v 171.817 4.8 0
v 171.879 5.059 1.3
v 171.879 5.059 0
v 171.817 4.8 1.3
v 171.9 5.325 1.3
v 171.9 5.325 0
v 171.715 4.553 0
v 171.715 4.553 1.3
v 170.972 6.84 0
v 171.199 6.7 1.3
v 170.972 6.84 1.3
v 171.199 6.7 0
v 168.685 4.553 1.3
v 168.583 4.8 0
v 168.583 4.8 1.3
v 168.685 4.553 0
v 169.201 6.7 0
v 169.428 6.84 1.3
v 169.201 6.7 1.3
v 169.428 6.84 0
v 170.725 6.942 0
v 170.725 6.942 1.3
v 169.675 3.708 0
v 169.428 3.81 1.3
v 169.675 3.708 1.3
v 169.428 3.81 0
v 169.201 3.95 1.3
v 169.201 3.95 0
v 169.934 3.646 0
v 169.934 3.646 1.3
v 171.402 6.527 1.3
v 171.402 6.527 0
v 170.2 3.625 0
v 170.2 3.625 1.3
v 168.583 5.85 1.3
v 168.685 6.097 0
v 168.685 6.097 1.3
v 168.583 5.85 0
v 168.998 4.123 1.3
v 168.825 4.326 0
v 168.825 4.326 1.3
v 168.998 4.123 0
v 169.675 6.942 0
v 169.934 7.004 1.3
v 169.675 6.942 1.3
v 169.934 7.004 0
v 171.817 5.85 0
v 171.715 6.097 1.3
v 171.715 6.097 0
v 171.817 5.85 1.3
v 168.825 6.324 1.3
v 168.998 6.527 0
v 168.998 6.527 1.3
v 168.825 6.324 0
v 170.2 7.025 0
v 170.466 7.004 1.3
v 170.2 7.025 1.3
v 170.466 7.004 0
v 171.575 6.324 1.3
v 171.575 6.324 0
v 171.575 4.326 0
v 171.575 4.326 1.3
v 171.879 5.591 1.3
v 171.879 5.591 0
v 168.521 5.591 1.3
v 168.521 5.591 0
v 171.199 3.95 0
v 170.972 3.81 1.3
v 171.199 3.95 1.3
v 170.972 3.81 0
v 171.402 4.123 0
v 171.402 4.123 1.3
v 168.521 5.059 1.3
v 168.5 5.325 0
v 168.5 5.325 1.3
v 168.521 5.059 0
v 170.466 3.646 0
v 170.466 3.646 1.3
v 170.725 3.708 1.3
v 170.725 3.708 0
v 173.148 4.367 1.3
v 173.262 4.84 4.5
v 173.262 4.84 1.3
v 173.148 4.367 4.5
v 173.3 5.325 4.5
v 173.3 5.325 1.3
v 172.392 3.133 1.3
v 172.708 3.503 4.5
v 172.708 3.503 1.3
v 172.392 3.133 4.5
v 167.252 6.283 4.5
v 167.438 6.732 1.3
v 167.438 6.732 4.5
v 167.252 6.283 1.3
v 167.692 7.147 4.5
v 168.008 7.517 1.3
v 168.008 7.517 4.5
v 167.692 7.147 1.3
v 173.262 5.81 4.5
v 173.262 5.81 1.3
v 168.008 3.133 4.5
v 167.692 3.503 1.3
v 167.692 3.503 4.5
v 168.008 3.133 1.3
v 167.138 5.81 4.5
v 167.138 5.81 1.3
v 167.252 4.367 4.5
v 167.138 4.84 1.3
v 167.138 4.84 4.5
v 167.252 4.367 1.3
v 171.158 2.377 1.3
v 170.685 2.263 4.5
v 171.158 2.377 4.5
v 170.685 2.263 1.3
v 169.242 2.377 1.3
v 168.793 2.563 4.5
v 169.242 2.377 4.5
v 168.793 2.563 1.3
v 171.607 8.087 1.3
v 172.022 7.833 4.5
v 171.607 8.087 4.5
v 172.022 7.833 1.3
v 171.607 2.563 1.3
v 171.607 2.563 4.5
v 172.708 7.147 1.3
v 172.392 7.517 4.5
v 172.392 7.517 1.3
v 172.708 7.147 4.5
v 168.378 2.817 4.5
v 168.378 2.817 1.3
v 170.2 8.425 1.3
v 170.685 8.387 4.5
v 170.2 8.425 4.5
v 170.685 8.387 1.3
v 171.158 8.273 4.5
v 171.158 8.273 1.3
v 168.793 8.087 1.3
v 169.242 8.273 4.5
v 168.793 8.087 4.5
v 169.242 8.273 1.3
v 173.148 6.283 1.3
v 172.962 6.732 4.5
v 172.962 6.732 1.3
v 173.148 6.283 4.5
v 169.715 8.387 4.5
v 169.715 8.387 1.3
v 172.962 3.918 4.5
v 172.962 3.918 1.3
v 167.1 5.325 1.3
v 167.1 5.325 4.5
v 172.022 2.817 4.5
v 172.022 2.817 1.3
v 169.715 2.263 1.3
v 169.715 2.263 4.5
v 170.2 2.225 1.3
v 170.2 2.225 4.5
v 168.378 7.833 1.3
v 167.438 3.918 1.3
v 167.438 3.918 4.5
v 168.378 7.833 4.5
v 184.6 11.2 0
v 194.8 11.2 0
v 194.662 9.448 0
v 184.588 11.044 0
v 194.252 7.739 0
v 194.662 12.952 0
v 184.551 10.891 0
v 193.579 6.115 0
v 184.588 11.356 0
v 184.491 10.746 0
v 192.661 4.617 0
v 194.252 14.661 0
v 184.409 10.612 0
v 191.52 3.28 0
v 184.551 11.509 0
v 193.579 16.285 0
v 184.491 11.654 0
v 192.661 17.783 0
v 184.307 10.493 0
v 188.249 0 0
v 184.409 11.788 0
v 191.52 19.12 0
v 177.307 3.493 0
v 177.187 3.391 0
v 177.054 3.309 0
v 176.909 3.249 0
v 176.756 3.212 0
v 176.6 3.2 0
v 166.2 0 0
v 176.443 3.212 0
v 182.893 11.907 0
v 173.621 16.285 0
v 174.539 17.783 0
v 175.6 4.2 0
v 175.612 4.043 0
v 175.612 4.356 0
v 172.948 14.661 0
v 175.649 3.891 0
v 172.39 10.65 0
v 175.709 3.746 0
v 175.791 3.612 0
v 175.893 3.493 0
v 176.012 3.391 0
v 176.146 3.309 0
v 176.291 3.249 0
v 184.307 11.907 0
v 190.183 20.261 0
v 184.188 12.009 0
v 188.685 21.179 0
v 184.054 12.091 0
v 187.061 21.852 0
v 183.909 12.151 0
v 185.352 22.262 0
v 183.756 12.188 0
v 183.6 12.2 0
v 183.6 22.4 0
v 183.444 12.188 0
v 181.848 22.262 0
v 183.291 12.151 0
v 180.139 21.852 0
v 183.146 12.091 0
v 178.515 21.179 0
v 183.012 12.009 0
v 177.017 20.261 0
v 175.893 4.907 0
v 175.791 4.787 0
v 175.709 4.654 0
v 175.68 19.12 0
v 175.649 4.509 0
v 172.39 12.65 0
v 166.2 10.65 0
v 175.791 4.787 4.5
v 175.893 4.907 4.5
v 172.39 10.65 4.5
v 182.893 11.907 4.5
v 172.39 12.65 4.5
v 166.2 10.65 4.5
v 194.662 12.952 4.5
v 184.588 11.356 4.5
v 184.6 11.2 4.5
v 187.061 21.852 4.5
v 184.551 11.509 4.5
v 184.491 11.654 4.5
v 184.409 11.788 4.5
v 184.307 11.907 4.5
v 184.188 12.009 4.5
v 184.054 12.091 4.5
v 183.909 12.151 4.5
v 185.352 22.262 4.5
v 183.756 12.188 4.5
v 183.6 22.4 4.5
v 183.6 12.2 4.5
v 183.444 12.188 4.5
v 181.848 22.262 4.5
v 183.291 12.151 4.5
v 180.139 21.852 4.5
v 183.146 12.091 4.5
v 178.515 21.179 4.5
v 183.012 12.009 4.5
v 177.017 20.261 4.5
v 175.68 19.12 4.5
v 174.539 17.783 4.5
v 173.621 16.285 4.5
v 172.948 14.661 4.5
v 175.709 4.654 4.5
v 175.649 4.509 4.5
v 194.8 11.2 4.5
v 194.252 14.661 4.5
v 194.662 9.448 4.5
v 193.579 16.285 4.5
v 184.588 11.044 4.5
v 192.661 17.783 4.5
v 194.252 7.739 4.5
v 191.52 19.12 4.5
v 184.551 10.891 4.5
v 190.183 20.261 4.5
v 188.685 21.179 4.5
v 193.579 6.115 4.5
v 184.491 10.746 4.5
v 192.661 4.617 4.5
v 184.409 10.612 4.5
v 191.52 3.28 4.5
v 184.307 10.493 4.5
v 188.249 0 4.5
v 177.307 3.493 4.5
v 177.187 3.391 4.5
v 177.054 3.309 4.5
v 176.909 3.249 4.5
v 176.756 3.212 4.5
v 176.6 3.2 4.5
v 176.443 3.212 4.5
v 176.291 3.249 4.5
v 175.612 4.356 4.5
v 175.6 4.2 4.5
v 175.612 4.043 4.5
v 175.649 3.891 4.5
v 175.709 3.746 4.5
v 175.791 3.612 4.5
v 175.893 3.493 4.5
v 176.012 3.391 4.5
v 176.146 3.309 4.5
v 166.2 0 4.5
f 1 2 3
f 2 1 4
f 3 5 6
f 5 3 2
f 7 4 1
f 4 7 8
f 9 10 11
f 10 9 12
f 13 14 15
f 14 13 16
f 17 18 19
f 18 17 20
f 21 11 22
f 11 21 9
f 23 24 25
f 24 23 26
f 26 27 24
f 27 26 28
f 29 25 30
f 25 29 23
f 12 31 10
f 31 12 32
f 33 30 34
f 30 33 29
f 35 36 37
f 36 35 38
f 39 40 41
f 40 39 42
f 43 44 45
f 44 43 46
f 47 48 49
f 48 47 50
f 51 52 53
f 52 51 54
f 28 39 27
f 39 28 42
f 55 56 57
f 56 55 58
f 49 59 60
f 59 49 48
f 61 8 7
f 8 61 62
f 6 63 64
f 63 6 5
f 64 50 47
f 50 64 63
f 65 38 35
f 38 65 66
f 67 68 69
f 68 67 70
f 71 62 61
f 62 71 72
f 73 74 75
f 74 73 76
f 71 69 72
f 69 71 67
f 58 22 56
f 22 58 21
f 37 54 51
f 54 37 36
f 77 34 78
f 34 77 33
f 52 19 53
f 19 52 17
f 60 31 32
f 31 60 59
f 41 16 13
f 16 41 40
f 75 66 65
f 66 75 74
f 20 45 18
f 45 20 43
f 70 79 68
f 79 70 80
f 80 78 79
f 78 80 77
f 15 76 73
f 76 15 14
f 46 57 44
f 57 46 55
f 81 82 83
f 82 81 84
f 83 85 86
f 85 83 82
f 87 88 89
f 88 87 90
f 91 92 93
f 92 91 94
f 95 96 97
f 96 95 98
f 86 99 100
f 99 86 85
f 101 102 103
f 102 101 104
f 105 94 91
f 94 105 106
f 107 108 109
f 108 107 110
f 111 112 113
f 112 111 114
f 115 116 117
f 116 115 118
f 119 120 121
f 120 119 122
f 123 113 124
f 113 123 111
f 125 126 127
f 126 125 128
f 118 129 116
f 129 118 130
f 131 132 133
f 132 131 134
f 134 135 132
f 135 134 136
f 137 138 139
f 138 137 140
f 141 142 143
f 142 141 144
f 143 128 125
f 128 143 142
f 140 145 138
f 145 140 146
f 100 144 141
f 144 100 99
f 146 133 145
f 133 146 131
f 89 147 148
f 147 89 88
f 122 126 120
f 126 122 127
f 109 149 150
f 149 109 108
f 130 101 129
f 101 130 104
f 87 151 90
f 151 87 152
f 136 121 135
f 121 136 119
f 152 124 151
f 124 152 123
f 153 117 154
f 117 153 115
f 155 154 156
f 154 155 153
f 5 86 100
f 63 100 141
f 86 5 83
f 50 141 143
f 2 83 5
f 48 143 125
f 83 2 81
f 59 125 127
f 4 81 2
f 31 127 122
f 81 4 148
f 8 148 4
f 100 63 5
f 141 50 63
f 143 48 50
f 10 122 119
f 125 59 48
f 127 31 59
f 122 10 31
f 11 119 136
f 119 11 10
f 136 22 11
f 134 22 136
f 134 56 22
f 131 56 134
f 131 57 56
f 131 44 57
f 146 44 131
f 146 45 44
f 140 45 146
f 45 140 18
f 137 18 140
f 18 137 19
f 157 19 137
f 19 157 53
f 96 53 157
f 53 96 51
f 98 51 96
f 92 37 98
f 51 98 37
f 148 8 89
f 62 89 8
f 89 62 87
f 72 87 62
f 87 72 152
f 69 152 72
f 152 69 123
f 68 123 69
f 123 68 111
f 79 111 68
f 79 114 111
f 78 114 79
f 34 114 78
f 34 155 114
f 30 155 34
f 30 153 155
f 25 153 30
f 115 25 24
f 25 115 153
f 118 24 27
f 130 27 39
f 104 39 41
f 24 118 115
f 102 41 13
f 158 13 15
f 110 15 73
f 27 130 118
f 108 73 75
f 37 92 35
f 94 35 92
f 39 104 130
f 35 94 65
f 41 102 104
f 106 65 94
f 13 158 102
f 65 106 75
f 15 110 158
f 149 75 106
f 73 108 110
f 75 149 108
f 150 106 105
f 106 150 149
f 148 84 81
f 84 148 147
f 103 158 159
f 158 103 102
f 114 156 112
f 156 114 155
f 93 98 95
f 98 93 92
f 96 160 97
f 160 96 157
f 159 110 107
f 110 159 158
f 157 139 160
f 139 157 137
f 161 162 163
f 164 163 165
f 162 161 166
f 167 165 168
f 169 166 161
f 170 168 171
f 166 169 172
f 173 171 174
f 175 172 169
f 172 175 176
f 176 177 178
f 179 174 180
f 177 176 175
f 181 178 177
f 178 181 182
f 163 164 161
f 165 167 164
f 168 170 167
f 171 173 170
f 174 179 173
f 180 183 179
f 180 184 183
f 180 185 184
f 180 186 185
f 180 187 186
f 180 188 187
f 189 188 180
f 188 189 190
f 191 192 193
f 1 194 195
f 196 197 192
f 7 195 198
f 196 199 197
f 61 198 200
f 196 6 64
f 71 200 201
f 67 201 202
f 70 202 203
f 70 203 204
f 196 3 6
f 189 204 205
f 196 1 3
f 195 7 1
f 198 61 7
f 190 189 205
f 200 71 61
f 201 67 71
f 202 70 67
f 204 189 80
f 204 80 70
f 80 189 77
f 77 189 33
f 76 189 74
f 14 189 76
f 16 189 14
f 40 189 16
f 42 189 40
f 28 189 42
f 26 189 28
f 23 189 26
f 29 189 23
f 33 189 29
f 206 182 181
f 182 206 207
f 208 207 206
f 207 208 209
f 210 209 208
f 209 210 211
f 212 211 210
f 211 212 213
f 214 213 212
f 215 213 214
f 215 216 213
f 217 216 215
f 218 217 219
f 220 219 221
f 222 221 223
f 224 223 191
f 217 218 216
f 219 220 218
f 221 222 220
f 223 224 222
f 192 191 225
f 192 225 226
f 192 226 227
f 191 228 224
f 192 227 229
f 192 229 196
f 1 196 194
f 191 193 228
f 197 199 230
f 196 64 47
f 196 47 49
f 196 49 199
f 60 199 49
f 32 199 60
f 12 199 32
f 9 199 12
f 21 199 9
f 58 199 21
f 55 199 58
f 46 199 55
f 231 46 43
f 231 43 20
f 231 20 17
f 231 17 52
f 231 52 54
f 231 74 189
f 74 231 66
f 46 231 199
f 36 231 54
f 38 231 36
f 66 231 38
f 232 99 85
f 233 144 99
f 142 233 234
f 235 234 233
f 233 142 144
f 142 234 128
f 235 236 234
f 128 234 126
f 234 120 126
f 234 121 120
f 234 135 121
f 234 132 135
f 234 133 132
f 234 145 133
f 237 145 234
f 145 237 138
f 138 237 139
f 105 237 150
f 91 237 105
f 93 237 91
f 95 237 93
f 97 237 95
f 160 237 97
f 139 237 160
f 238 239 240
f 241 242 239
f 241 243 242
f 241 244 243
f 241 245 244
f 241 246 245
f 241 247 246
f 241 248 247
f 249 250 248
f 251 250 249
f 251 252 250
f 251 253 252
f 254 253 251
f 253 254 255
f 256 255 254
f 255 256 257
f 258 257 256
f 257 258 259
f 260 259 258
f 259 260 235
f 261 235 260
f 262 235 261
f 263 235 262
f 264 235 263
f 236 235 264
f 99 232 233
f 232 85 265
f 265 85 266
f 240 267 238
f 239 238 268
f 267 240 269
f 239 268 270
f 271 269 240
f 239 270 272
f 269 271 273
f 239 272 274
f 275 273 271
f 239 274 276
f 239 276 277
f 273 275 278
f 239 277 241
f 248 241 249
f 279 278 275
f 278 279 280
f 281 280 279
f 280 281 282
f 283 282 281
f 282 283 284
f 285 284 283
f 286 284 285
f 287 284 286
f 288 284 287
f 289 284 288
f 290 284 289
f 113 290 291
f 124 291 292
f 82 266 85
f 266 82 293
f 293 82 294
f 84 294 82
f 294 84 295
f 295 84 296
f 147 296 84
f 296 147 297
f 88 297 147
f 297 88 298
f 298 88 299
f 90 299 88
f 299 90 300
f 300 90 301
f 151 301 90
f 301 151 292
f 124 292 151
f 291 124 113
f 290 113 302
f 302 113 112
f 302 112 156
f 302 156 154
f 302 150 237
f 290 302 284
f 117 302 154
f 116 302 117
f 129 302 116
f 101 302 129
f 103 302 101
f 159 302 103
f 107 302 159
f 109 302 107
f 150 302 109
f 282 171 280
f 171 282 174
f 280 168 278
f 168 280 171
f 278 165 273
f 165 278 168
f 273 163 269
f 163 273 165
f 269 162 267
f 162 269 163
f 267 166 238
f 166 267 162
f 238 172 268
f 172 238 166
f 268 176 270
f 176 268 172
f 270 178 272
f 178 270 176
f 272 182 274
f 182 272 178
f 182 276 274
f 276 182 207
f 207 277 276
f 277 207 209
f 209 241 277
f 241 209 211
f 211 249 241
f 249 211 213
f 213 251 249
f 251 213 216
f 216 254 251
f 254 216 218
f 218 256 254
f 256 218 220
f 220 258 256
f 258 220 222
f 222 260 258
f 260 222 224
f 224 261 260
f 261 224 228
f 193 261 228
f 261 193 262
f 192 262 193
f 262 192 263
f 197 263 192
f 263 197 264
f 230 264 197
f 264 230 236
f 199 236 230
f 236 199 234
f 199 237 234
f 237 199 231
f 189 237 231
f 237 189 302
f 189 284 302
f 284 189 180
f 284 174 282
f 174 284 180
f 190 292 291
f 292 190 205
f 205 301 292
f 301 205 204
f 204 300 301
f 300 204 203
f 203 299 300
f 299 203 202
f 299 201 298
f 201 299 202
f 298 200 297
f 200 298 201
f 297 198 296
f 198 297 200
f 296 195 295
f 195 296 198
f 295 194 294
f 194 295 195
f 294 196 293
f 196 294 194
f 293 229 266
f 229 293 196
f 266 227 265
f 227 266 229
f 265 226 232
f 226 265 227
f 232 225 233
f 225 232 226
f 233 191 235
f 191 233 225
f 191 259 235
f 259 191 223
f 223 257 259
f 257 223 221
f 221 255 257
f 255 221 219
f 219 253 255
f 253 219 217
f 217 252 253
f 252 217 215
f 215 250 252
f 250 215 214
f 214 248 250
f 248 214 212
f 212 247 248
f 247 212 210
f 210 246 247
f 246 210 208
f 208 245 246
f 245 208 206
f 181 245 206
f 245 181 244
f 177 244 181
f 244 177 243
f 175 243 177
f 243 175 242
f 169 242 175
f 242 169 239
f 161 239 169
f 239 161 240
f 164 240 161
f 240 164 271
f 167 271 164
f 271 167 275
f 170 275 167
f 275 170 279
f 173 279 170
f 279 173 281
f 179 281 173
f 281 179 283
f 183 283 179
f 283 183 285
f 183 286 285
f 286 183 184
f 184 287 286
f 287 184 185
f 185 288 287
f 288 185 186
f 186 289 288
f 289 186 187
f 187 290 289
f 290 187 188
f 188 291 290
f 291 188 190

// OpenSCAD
include <../lib/kobo-meshcore-case-lib.scad>;
$fn = 40;
end_cap_print();
